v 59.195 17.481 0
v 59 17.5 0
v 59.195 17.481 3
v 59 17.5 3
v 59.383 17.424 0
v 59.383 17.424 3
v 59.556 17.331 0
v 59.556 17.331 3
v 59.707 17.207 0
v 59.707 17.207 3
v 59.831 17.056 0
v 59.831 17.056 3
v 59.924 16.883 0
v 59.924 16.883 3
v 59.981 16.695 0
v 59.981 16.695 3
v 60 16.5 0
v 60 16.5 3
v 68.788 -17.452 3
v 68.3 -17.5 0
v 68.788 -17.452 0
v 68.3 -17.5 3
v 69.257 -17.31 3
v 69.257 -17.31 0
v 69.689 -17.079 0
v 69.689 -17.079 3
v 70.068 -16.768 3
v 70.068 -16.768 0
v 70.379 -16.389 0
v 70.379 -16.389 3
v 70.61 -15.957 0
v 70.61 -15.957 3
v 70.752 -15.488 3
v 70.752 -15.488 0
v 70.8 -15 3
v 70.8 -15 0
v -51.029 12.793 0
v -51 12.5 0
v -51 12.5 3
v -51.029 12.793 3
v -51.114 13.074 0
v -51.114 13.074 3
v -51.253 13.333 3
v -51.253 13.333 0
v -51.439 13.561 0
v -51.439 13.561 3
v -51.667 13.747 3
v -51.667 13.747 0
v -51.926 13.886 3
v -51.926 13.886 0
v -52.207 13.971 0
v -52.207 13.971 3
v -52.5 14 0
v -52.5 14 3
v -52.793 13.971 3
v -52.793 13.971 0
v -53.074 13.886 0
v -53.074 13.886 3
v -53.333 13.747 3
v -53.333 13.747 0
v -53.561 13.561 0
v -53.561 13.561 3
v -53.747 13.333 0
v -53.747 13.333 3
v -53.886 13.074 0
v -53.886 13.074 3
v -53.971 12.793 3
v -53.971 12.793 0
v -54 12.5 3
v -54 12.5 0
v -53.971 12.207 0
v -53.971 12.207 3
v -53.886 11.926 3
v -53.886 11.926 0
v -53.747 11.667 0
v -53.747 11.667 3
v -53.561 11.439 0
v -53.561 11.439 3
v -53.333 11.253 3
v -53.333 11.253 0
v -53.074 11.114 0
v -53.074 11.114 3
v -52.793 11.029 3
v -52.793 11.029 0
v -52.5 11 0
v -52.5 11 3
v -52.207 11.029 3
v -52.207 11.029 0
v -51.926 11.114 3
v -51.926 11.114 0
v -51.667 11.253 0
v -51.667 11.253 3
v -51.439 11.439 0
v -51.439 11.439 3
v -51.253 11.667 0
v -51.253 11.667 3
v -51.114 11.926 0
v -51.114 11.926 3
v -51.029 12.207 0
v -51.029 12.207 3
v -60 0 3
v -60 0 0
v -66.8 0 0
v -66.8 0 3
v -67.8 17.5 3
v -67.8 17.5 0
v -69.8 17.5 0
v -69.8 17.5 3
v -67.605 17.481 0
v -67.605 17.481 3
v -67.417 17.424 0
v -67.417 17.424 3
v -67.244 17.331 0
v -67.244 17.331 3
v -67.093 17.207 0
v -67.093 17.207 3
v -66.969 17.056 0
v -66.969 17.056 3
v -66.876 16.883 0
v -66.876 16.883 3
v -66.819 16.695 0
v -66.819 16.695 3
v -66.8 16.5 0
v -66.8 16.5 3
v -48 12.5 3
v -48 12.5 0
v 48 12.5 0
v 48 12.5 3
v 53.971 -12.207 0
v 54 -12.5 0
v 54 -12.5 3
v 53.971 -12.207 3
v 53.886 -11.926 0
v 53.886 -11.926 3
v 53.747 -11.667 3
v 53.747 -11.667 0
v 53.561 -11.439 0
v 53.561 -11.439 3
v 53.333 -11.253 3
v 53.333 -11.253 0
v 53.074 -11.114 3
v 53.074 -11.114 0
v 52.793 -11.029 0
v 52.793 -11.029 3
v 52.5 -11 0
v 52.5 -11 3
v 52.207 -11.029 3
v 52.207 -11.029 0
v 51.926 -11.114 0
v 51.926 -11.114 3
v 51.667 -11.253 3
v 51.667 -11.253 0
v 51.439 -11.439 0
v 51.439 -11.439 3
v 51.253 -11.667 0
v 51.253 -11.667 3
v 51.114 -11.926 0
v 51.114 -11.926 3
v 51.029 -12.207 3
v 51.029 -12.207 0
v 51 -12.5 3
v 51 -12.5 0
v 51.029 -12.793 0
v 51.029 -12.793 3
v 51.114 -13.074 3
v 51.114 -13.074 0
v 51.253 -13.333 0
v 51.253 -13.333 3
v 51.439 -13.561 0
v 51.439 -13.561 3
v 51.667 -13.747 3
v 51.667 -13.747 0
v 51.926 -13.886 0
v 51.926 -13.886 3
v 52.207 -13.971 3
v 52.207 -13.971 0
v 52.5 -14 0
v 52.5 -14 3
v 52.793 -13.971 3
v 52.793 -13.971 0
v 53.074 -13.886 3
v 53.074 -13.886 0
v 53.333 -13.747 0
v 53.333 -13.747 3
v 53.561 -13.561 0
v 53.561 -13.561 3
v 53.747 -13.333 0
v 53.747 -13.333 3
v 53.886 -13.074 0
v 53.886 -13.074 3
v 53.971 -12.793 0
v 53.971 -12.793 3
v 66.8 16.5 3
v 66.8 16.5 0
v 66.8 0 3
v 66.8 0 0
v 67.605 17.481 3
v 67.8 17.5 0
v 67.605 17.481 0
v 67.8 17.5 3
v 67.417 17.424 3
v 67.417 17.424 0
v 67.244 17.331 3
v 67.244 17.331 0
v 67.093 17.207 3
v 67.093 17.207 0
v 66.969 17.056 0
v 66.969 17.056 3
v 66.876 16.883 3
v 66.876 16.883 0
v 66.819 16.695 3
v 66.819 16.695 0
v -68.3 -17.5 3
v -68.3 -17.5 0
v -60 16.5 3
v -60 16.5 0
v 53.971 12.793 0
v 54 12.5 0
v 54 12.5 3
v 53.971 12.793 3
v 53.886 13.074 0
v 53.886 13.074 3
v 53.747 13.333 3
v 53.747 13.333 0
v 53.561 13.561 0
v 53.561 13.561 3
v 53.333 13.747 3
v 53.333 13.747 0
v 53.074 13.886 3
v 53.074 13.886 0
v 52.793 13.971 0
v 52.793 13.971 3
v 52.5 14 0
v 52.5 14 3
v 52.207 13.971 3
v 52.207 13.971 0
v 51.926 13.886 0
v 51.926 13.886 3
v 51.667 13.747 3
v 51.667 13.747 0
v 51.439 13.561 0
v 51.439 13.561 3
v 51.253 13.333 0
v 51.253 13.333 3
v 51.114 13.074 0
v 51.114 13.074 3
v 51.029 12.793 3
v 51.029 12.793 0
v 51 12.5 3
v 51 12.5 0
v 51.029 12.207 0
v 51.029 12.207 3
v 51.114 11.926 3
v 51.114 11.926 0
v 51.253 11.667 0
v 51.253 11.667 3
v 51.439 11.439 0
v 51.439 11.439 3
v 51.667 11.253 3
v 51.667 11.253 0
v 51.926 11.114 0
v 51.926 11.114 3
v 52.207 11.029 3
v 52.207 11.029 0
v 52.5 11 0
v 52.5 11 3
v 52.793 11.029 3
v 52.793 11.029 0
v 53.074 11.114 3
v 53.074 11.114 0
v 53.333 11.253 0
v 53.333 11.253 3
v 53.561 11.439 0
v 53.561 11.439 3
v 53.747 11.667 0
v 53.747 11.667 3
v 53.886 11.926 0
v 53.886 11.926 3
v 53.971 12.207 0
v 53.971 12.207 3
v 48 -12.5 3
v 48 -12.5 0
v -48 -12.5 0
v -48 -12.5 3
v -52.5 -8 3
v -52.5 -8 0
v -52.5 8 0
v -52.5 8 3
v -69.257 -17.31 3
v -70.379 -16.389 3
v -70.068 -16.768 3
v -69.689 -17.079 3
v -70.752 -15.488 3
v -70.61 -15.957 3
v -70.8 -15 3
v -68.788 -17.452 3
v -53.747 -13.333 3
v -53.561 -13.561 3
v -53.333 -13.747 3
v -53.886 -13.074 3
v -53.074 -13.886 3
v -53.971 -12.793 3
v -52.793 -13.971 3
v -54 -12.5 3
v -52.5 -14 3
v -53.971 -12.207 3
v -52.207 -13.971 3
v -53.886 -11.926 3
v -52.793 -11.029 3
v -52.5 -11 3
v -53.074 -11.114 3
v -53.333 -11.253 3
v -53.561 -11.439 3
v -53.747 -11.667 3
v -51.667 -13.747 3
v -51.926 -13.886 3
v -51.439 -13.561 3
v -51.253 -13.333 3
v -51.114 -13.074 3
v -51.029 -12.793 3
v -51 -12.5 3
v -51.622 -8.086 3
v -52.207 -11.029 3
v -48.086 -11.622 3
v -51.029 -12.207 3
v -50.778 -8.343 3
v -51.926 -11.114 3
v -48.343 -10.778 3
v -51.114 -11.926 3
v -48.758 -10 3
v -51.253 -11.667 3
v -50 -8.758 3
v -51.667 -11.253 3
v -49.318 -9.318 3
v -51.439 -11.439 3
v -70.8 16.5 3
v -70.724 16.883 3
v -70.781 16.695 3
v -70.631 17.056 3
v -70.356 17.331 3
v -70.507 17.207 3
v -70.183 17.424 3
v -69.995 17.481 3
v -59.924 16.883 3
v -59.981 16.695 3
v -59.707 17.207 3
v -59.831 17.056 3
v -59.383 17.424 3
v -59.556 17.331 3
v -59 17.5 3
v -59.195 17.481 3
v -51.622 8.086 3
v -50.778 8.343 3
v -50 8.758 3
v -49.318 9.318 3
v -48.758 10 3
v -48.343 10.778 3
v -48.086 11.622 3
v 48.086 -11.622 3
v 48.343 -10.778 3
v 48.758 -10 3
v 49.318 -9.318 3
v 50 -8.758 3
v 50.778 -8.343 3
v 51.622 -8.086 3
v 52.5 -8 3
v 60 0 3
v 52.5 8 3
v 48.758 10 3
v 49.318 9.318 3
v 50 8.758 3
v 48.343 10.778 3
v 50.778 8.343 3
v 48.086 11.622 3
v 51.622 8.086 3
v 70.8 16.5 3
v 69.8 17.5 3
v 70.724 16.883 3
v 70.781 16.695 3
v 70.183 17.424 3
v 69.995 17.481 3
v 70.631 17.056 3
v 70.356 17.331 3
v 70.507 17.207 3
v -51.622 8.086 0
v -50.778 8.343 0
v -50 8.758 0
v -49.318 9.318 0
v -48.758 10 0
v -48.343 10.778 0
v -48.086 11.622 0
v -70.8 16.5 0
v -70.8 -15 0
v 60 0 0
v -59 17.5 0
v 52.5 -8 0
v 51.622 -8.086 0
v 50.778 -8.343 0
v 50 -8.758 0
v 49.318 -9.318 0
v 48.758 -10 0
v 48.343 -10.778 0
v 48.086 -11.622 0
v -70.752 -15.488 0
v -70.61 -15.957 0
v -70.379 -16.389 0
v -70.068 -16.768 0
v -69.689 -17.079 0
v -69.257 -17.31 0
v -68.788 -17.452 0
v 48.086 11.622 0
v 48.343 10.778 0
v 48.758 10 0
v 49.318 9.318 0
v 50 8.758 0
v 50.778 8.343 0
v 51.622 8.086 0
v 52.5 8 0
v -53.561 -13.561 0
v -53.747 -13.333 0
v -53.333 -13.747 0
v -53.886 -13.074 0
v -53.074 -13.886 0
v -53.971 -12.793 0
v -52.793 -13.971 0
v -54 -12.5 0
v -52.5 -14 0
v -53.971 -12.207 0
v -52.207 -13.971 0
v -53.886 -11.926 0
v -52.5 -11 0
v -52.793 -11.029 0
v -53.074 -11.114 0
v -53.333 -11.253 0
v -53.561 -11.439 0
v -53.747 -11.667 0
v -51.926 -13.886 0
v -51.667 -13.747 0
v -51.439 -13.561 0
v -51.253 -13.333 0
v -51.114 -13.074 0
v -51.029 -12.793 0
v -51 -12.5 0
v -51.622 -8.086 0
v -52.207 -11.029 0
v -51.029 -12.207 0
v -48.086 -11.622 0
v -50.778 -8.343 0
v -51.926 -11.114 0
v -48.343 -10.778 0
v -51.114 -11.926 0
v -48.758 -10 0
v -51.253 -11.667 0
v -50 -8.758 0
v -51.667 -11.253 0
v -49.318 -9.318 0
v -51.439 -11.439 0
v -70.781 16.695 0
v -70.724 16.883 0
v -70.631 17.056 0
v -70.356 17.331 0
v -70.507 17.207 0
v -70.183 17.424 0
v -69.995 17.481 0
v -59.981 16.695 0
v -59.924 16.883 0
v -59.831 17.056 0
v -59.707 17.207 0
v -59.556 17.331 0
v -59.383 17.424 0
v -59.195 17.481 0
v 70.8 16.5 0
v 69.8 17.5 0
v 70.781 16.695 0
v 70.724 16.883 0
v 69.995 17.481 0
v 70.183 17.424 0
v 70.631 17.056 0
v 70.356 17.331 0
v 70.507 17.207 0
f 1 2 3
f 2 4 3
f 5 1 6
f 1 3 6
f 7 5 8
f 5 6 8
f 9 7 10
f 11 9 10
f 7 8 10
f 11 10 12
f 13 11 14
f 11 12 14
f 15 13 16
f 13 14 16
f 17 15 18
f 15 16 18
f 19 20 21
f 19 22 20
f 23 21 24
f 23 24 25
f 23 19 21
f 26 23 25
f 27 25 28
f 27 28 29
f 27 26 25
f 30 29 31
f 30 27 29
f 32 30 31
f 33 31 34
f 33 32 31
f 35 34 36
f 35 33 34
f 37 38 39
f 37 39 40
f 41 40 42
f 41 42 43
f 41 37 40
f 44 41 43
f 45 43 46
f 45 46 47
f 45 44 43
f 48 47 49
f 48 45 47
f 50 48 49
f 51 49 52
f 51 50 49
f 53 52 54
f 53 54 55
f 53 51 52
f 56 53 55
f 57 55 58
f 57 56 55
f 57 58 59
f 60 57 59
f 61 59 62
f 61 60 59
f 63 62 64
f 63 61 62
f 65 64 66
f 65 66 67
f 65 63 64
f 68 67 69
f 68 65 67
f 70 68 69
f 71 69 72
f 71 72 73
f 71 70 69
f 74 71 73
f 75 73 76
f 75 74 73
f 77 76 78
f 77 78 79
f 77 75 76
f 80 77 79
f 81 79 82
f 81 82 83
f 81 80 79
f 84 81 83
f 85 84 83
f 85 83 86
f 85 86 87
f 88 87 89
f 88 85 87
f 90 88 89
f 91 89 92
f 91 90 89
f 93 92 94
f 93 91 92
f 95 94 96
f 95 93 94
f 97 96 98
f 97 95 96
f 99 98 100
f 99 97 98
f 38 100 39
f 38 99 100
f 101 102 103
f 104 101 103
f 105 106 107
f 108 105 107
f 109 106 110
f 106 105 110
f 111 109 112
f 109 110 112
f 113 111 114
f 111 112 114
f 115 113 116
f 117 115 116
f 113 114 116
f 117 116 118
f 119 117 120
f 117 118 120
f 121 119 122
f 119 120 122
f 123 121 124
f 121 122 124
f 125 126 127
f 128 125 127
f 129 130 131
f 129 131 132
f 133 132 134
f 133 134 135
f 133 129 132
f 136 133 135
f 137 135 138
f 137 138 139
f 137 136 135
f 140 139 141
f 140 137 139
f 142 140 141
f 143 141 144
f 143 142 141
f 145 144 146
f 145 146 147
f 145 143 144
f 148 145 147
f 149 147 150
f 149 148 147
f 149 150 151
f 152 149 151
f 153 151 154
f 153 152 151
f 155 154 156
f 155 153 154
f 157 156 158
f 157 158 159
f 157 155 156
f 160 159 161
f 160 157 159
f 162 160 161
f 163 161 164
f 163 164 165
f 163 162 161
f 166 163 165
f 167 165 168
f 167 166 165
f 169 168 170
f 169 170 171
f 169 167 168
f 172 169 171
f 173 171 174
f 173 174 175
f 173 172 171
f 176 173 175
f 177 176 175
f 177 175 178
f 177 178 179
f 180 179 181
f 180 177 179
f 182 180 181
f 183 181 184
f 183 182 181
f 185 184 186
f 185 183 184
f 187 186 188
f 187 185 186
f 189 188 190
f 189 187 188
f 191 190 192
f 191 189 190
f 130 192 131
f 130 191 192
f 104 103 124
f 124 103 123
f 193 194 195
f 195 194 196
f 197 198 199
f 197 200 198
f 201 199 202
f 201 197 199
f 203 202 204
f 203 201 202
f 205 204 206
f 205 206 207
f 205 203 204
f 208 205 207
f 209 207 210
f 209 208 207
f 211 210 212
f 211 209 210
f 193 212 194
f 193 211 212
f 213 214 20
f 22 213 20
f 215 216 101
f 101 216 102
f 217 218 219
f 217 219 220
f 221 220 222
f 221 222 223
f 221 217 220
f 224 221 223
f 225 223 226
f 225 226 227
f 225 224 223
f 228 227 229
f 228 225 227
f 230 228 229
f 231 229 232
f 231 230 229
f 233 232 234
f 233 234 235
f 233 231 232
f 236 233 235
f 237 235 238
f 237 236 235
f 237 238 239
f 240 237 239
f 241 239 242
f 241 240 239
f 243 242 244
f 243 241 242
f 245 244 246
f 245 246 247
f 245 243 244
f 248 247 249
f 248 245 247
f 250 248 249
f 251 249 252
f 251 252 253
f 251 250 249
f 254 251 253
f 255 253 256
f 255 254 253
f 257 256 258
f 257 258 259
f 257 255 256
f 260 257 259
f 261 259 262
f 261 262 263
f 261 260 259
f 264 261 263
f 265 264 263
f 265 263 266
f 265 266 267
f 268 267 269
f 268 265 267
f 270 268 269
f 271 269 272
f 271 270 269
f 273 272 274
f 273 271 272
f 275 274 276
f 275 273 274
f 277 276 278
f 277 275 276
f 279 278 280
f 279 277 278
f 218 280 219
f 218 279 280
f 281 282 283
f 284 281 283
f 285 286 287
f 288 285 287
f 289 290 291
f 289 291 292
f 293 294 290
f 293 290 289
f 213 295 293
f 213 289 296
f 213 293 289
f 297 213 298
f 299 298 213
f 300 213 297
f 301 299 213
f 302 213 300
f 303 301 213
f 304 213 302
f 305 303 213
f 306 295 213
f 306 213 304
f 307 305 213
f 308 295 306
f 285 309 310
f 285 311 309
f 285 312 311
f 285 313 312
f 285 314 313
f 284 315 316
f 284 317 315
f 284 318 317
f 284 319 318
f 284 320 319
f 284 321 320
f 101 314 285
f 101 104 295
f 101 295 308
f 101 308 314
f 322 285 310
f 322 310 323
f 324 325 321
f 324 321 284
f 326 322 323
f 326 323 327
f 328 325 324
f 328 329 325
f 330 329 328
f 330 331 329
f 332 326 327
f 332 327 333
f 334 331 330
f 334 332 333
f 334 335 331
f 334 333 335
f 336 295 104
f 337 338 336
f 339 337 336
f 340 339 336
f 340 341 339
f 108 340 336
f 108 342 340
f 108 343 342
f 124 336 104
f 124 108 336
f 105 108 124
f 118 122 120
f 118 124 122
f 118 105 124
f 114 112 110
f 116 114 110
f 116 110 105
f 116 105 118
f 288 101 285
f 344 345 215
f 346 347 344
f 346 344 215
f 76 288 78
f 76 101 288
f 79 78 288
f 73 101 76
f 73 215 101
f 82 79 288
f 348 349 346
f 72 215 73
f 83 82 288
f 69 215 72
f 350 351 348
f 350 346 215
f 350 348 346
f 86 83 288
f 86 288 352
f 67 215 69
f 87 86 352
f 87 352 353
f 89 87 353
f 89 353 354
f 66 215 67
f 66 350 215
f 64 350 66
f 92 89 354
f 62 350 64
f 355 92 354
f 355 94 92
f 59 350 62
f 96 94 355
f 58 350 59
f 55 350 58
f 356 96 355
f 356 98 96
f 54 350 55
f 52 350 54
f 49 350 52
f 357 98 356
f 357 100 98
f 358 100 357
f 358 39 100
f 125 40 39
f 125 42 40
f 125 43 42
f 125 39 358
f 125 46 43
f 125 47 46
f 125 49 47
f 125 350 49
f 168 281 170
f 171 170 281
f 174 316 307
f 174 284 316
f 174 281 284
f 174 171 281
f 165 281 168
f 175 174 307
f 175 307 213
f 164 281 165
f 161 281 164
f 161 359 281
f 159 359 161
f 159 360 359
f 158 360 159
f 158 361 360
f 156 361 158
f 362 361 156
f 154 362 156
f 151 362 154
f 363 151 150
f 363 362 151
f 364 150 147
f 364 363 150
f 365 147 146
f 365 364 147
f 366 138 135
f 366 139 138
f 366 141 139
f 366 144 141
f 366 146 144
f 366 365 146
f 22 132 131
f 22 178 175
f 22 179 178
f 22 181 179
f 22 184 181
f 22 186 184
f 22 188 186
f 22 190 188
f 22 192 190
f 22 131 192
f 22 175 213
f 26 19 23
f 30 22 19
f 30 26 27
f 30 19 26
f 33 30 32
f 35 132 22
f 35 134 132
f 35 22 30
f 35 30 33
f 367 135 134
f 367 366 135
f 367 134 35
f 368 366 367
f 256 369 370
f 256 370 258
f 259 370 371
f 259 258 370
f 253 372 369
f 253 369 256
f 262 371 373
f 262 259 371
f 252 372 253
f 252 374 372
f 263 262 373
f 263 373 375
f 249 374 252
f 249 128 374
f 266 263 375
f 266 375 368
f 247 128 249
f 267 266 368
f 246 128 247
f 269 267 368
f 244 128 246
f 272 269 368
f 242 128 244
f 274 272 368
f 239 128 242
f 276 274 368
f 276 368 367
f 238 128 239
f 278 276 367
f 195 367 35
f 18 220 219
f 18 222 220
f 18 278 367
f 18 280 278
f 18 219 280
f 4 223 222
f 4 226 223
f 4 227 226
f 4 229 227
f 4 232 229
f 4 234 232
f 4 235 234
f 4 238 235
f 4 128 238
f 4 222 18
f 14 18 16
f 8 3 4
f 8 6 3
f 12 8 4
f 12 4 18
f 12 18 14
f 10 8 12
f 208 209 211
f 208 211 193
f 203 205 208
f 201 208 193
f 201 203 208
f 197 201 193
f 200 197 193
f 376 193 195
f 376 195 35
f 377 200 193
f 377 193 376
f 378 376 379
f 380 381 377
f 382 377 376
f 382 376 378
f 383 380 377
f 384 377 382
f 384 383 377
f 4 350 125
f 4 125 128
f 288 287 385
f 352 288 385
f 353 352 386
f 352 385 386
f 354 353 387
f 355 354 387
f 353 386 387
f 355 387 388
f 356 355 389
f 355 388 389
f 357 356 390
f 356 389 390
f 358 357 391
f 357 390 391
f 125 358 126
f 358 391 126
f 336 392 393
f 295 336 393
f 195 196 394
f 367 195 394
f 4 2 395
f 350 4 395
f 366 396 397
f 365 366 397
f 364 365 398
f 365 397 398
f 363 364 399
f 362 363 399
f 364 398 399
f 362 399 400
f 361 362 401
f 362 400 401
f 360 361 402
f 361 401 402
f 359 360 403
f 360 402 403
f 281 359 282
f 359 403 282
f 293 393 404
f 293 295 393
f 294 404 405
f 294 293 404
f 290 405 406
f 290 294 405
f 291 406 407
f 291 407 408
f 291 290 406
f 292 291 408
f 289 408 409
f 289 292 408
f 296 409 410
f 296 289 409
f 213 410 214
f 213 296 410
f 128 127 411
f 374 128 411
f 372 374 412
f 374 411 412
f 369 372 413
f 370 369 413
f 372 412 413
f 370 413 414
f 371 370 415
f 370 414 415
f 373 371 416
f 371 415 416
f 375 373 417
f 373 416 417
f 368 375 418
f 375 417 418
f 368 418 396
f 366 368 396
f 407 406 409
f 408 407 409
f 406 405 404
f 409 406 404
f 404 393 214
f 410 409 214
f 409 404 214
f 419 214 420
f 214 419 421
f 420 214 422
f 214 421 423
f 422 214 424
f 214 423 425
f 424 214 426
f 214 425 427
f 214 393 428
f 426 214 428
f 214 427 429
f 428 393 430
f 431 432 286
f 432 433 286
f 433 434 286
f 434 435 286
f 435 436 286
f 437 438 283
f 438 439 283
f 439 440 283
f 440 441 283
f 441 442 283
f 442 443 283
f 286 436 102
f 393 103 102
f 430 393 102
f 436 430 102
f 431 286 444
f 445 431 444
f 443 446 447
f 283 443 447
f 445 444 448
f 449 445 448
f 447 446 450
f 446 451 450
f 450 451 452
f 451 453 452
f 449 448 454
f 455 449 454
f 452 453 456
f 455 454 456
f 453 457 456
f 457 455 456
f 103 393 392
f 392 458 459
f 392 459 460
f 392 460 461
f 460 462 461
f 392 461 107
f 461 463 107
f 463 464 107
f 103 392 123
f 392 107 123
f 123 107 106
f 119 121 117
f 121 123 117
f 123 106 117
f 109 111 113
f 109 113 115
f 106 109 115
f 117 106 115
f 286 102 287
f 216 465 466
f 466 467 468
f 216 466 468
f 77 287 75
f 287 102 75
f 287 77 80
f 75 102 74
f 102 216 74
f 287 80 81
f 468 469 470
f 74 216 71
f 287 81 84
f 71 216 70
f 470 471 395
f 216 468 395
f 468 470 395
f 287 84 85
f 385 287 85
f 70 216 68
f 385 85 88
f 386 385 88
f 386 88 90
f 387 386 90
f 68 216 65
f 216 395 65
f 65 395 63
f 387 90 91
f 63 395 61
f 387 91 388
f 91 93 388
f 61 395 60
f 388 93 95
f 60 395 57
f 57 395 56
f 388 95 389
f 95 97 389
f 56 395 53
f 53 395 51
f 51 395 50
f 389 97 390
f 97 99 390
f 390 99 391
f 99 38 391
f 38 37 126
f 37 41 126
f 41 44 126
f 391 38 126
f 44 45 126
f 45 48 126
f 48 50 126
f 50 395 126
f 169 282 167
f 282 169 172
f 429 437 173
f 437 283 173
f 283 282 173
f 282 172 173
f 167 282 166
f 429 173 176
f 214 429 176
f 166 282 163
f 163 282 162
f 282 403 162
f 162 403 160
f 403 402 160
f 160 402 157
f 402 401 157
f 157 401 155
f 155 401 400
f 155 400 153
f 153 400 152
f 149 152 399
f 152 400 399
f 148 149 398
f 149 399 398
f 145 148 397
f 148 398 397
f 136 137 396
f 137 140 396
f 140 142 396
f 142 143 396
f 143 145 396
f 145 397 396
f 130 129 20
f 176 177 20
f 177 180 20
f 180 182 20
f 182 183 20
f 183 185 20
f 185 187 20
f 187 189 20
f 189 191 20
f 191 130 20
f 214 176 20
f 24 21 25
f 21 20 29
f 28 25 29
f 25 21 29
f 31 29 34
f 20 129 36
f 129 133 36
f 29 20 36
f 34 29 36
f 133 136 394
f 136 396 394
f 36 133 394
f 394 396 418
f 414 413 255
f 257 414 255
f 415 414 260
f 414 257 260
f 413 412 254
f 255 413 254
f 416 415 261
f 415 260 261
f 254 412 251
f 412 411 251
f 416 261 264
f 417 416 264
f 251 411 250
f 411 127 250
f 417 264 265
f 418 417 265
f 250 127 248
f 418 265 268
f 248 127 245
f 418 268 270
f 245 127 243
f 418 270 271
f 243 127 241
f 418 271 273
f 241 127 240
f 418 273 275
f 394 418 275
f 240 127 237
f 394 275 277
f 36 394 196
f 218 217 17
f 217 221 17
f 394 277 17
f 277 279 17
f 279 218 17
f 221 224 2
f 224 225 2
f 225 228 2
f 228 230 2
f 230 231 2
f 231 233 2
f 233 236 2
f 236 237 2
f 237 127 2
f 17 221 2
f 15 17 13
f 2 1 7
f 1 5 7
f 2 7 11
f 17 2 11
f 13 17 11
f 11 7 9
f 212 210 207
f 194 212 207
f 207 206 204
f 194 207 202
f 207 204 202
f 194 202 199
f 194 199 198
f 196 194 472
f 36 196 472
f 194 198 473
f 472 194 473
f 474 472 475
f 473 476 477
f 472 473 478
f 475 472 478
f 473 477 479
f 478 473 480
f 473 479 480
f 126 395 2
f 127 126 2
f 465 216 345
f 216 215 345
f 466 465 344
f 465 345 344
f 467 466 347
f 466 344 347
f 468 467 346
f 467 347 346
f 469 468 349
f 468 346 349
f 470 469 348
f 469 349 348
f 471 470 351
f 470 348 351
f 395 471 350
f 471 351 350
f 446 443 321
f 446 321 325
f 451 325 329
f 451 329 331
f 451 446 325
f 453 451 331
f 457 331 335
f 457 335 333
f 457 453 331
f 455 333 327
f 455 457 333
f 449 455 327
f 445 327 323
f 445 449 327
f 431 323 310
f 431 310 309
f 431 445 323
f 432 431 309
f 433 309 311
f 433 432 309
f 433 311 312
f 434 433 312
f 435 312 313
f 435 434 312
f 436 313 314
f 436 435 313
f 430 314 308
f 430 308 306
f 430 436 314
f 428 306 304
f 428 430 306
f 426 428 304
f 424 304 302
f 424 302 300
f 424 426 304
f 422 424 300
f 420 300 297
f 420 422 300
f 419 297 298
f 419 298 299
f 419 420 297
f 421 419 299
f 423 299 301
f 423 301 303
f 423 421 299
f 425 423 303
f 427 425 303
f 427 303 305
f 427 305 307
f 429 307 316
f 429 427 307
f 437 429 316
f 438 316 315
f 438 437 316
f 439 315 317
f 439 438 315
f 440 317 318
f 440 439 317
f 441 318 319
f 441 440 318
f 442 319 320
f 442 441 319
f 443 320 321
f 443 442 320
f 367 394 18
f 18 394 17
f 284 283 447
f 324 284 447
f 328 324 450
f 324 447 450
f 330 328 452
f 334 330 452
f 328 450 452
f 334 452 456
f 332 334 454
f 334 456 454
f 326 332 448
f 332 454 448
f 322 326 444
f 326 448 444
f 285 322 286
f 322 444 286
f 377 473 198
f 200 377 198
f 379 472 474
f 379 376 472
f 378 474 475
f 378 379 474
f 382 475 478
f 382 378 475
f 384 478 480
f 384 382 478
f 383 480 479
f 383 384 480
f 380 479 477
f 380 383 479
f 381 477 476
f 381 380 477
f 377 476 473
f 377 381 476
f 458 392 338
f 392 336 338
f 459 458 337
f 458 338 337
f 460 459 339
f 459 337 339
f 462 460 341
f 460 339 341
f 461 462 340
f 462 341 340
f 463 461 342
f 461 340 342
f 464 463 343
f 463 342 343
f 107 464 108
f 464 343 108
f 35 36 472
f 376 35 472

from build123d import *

# Parameters (mm, degrees)
SKETCH_1_R      = 1.5
EXTRUDE_1_DEPTH = 3
FILLET_1_R      = 2.5
FILLET_2_R      = 1


with BuildPart() as part:
    # Эскиз1 → Бобышка-Вытянуть1 (new body)
    with BuildSketch(Plane.XY):
        Polygon((-60, 17.5), (-60, 0), (-66.8, 0), (-66.8, 17.5), (-70.8, 17.5), (-70.8, -17.5), (70.8, -17.5), (70.8, 17.5), (66.8, 17.5), (66.8, 0), (60, 0), (60, 17.5), align=None)
        with BuildLine():
            Line((48, -12.5), (-48, -12.5))
            ThreePointArc((-48, -12.5), (-49.318019485, -9.318019485), (-52.5, -8))
            Line((-52.5, -8), (-52.5, 8))
            ThreePointArc((-52.5, 8), (-49.318019485, 9.318019485), (-48, 12.5))
            Line((-48, 12.5), (48, 12.5))
            ThreePointArc((48, 12.5), (49.318019485, 9.318019485), (52.5, 8))
            Line((52.5, 8), (52.5, -8))
            ThreePointArc((52.5, -8), (49.318019485, -9.318019485), (48, -12.5))
        make_face(mode=Mode.SUBTRACT)
        with Locations((-52.5, 12.5)):
            Circle(SKETCH_1_R, mode=Mode.SUBTRACT)
        with Locations((-52.5, -12.5)):
            Circle(SKETCH_1_R, mode=Mode.SUBTRACT)
        with Locations((52.5, -12.5)):
            Circle(SKETCH_1_R, mode=Mode.SUBTRACT)
        with Locations((52.5, 12.5)):
            Circle(SKETCH_1_R, mode=Mode.SUBTRACT)
    extrude(amount=EXTRUDE_1_DEPTH)

    # Скругление1
    fillet_1_edges = [part.edges().sort_by_distance(p)[0] for p in [
        (-70.8, -17.5, 1.5),
        (70.8, -17.5, 1.5),
    ]]
    fillet(fillet_1_edges, radius=FILLET_1_R)

    # Скругление2
    fillet_2_edges = [part.edges().sort_by_distance(p)[0] for p in [
        (-70.8, 17.5, 1.5),
        (-66.8, 17.5, 1.5),
        (-60, 17.5, 1.5),
        (60, 17.5, 1.5),
        (66.8, 17.5, 1.5),
        (70.8, 17.5, 1.5),
    ]]
    fillet(fillet_2_edges, radius=FILLET_2_R)


solid = part.part
